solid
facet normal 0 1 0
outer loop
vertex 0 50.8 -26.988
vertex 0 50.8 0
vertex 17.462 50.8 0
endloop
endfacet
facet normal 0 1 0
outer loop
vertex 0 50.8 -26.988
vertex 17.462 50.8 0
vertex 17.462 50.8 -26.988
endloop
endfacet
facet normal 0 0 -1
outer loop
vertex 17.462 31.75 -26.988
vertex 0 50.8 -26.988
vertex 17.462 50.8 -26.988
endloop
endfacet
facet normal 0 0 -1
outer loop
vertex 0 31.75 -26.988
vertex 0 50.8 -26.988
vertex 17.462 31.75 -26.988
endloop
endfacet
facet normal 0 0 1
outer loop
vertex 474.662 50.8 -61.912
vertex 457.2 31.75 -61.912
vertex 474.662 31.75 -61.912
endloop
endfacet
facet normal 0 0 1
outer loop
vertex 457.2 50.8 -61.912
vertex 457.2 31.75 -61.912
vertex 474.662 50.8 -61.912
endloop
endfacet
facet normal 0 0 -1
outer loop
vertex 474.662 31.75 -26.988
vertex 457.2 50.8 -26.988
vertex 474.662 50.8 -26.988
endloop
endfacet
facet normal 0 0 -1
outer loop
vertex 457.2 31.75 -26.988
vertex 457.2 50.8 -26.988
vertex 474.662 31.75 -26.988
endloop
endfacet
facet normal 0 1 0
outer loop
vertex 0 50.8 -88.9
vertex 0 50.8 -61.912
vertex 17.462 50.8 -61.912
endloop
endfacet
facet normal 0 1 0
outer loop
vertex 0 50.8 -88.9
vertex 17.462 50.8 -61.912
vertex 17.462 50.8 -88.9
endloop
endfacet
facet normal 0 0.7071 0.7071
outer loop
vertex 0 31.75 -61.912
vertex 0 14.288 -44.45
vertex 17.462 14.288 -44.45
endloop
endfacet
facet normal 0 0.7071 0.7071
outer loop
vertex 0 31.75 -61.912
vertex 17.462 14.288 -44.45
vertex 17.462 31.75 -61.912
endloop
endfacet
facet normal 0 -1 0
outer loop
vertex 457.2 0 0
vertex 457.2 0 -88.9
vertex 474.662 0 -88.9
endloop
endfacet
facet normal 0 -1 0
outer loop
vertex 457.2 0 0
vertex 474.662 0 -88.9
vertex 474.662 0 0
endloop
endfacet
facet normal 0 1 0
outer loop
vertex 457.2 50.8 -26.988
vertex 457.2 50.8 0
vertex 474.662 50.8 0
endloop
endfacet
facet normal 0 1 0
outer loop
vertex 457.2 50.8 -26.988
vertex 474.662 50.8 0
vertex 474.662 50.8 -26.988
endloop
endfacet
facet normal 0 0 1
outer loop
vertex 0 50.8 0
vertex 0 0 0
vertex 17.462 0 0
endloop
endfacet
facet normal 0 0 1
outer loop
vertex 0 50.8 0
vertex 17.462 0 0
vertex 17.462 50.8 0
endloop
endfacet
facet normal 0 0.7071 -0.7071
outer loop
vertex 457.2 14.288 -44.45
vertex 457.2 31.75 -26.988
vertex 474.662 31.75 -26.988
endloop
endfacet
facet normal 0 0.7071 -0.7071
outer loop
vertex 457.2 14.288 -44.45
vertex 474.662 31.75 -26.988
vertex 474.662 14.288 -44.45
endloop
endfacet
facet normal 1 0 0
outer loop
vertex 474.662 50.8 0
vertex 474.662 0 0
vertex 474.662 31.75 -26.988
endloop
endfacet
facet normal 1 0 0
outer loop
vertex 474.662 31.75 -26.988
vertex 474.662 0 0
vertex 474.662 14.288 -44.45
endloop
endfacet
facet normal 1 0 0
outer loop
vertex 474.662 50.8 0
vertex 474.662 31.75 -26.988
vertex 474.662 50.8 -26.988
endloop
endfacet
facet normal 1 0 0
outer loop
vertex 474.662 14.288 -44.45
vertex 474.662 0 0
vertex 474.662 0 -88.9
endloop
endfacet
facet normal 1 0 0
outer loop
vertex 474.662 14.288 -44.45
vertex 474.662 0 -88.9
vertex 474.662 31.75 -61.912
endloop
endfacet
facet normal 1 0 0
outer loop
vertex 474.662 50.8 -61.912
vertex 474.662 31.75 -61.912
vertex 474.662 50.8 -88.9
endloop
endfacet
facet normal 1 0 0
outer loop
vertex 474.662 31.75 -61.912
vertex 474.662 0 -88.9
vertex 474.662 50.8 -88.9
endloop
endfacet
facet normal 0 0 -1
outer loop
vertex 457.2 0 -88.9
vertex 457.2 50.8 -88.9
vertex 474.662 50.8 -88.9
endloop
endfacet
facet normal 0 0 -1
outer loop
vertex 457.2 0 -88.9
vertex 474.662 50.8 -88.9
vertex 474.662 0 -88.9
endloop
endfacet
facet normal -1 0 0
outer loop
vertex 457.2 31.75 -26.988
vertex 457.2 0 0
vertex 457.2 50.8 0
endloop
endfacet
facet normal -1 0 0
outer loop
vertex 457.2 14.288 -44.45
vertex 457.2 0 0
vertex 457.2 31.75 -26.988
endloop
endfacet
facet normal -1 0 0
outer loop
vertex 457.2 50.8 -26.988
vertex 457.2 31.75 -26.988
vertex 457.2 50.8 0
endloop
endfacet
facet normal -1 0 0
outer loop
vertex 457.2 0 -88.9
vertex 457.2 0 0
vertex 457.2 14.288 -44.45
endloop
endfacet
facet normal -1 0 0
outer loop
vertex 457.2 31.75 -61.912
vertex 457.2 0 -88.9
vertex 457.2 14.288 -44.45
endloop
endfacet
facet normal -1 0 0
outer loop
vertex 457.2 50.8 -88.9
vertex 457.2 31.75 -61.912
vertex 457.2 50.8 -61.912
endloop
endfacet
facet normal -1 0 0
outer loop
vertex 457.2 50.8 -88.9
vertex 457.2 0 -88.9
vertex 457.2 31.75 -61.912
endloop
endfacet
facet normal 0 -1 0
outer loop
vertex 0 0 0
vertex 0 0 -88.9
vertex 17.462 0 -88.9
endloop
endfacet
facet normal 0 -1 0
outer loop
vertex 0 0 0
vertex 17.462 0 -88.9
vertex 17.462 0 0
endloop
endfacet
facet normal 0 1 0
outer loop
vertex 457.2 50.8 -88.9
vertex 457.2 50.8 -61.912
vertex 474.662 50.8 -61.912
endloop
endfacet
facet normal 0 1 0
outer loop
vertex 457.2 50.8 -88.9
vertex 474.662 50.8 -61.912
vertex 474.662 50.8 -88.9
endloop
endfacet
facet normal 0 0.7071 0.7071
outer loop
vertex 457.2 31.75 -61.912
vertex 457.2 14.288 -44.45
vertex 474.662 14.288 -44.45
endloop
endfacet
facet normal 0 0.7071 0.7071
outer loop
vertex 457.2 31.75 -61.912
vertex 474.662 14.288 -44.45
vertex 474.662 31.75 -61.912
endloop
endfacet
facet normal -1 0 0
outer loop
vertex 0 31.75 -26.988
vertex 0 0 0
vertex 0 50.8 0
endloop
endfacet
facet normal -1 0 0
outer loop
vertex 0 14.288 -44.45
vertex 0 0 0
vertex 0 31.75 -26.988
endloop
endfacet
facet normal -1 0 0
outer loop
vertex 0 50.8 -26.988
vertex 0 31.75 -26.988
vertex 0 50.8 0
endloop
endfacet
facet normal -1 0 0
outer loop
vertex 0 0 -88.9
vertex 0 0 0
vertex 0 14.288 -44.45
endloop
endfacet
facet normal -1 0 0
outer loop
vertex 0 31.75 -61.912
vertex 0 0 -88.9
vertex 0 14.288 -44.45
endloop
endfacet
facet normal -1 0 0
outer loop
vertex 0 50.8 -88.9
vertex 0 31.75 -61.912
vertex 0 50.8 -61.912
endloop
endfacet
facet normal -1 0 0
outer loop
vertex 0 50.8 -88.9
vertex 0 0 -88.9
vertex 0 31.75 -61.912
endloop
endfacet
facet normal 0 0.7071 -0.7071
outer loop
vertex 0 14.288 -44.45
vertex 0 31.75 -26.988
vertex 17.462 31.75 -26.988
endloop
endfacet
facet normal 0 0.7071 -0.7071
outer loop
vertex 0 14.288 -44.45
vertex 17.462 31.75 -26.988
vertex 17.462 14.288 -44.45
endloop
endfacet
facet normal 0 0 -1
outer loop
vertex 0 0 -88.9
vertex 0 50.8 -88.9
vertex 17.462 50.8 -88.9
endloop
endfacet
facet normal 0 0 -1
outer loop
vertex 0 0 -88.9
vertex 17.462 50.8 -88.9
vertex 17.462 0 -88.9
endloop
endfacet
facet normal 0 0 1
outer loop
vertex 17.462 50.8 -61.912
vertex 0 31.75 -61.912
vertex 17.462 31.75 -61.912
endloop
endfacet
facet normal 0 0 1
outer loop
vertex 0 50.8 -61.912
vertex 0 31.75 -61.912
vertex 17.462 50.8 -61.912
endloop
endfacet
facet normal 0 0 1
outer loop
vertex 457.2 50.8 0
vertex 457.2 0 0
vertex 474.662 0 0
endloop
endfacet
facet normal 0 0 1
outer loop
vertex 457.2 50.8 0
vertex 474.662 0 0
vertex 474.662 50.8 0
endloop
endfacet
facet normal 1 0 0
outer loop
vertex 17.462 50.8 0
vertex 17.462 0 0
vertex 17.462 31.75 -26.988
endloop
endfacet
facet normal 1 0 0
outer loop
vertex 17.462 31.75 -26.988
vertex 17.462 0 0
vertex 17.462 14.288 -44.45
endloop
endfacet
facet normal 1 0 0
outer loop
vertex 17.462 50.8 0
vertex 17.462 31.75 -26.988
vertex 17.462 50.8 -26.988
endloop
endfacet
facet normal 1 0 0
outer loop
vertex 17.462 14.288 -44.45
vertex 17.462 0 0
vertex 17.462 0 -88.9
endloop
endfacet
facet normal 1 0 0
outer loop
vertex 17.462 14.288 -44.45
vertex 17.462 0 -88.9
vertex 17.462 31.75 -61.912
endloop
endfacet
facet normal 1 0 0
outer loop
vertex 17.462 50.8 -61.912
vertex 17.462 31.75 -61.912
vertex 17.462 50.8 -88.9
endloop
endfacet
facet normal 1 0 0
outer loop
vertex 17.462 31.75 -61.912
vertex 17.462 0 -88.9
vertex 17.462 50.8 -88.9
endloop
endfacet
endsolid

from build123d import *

# Parameters (mm, degrees)
BOSS_EXTRUDE1_DEPTH = 17.4625
LPATTERN1_COUNT     = 2
LPATTERN1_PITCH     = 457.2


with BuildPart() as part:
    # Sketch1 → Boss-Extrude1 (new body)
    with BuildSketch(Plane(origin=(0, 0, 0), x_dir=(0, -1, 0), z_dir=(1, 0, 0))):
        Polygon((-31.75, 26.9875), (-14.2875, 44.45), (-31.75, 61.9125), (-50.8, 61.9125), (-50.8, 88.9), (0, 88.9), (0, 0), (-50.8, 0), (-50.8, 26.9875), align=None)
    extrude(amount=BOSS_EXTRUDE1_DEPTH)


with BuildPart() as lpattern1_1:
    # LPattern1: pattern copy
    add(part.part.moved(Location(Vector(1, 0, 0) * (1 * LPATTERN1_PITCH))))


solid = Compound([part.part, lpattern1_1.part])
